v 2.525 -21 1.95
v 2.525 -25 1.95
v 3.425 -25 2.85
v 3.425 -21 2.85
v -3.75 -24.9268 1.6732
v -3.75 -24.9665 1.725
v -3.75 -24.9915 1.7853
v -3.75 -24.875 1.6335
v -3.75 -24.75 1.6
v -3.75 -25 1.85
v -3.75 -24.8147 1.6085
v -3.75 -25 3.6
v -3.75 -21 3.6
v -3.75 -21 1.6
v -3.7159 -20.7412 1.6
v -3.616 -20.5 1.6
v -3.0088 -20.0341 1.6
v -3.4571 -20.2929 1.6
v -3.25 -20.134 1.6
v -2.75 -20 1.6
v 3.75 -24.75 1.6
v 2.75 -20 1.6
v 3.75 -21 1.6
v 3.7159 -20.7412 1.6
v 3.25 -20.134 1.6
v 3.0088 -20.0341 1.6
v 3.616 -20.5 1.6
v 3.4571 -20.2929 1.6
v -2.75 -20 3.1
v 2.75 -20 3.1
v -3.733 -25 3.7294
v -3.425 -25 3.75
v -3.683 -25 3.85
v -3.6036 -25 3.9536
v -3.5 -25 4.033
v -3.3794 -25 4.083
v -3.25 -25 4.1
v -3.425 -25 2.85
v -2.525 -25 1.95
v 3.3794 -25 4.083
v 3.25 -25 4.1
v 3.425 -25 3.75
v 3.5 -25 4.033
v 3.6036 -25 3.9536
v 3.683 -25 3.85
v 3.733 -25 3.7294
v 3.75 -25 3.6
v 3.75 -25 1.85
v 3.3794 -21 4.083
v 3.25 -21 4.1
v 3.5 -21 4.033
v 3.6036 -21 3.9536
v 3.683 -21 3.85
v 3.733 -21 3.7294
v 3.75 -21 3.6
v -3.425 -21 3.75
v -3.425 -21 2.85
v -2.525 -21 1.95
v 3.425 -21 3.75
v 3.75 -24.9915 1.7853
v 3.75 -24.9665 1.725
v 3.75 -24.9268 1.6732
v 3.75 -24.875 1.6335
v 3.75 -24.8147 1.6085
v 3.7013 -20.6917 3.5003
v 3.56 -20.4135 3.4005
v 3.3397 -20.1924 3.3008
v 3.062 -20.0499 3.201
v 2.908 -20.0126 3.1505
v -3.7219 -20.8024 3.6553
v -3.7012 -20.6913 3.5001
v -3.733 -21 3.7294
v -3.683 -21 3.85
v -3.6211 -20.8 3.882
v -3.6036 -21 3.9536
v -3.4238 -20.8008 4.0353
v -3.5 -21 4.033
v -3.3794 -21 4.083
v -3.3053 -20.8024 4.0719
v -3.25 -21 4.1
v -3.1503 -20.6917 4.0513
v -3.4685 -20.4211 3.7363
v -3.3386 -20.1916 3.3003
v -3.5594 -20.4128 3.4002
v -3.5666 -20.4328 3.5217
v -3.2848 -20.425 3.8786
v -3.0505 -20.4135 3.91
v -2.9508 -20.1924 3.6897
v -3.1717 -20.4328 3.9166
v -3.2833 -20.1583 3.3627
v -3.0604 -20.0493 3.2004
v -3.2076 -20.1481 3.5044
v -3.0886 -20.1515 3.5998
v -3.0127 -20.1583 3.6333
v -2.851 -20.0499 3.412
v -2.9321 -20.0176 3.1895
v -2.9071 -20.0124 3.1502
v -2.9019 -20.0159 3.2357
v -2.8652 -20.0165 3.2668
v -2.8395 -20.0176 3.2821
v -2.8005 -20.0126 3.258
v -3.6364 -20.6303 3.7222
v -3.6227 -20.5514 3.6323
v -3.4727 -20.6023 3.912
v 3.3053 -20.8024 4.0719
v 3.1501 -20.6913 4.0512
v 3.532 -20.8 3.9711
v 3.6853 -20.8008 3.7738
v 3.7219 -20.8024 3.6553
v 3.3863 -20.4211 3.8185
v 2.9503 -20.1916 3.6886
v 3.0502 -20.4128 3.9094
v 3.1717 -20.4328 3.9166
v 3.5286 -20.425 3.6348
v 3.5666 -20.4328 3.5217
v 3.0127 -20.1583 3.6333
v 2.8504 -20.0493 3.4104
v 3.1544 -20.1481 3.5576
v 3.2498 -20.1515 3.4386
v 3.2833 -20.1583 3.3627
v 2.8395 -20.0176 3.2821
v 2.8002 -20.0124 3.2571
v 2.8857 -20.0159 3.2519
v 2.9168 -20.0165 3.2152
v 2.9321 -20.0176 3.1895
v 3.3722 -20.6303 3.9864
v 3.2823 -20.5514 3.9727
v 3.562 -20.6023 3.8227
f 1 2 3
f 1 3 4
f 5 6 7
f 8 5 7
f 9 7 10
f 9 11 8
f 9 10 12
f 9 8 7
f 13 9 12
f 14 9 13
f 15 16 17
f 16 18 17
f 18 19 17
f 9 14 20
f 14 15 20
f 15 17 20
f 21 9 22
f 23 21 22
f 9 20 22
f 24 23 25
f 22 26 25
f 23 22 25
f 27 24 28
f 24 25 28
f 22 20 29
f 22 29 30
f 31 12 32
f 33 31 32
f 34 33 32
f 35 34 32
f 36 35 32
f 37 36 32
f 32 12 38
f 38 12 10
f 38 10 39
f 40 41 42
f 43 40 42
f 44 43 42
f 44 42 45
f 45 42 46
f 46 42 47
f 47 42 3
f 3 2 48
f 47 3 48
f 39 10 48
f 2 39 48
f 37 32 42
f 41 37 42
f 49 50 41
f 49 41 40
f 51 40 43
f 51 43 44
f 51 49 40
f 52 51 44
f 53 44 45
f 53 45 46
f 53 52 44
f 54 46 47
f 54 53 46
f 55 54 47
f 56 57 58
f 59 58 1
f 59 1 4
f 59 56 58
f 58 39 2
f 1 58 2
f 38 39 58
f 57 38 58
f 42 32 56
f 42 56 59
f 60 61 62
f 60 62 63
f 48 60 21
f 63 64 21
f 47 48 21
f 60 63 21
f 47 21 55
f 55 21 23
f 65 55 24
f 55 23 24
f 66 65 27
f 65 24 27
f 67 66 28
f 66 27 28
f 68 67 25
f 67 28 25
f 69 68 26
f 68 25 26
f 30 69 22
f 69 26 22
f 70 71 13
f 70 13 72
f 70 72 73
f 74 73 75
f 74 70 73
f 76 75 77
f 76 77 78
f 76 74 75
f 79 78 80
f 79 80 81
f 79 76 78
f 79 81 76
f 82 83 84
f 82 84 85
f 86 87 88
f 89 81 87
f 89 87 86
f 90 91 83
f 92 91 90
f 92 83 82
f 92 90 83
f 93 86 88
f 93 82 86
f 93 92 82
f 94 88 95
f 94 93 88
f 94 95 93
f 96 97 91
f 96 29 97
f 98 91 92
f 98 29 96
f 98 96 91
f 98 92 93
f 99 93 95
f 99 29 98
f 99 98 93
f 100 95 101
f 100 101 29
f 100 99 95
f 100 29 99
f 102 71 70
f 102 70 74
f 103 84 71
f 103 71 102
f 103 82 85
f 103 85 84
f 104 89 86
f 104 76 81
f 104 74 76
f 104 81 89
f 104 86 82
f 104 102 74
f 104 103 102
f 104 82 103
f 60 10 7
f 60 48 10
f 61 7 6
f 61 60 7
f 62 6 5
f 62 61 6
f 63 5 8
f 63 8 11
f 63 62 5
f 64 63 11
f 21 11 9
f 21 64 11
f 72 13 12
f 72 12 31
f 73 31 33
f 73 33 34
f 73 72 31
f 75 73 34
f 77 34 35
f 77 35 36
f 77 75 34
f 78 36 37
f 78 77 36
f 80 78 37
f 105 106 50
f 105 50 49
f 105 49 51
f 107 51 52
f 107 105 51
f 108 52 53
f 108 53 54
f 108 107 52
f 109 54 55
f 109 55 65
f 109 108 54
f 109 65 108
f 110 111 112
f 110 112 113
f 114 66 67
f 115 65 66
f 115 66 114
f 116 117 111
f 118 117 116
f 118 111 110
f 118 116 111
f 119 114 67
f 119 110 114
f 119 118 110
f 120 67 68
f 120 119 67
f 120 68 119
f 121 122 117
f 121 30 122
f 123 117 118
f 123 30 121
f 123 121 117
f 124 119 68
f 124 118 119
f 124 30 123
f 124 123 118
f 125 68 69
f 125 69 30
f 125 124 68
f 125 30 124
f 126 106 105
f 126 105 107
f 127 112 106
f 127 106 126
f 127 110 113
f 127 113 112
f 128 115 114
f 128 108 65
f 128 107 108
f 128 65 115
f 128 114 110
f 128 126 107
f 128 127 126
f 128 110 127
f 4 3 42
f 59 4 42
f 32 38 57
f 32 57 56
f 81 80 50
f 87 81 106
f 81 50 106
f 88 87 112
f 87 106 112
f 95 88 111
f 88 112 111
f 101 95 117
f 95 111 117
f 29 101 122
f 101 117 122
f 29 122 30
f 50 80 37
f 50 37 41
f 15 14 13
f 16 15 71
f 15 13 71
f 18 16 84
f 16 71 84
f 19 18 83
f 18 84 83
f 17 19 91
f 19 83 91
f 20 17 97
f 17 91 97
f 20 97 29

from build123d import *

# Parameters (mm, degrees)
SKETCH007_W     = 7.5
SKETCH007_H     = 5
PAD006_DEPTH    = 2.5
SKETCH008_W     = 6.85
SKETCH008_H     = 1.8
POCKET001_DEPTH = 4
FILLET_R        = 0.5
CHAMFER003_SIZE = 0.9
FILLET001_R     = 0.25
FILLET002_R     = 1


with BuildPart() as part:
    # Sketch007 (on Face1 of CopyPad003) → Pad006 (new body)
    with BuildSketch(Plane.XY.offset(1.6)):
        with Locations((0, -25.5)):
            Rectangle(SKETCH007_W, SKETCH007_H)
    extrude(amount=PAD006_DEPTH)

    # Sketch008 (on Face1 of Pad006) → Pocket001 (cut)
    with BuildSketch(Plane(origin=(0, -28, 1.6), x_dir=(1, 0, 0), z_dir=(0, -1, 0))):
        with Locations((0, 1.25)):
            Rectangle(SKETCH008_W, SKETCH008_H)
    extrude(amount=-POCKET001_DEPTH, mode=Mode.SUBTRACT)

    # Fillet
    fillet_edges = [part.edges().sort_by_distance(p)[0] for p in [
        (-3.75, -25.5, 4.1),
        (3.75, -25.5, 4.1),
    ]]
    fillet(fillet_edges, radius=FILLET_R)

    # Chamfer003
    chamfer003_edges = [part.edges().sort_by_distance(p)[0] for p in [
        (3.425, -26, 1.95),
        (-3.425, -26, 1.95),
    ]]
    chamfer(chamfer003_edges, length=CHAMFER003_SIZE)

    # Fillet001
    fillet001_edges = [part.edges().sort_by_distance(p)[0] for p in [
        (0, -28, 1.6),
    ]]
    fillet(fillet001_edges, radius=FILLET001_R)

    # Fillet002
    fillet002_edges = [part.edges().sort_by_distance(p)[0] for p in [
        (0, -23, 4.1),
    ]]
    fillet(fillet002_edges, radius=FILLET002_R)


with BuildPart() as part_1:
    # Body006 placement: moved
    add(part.part.moved(Location((0, 3, 0))))


solid = part_1.part
